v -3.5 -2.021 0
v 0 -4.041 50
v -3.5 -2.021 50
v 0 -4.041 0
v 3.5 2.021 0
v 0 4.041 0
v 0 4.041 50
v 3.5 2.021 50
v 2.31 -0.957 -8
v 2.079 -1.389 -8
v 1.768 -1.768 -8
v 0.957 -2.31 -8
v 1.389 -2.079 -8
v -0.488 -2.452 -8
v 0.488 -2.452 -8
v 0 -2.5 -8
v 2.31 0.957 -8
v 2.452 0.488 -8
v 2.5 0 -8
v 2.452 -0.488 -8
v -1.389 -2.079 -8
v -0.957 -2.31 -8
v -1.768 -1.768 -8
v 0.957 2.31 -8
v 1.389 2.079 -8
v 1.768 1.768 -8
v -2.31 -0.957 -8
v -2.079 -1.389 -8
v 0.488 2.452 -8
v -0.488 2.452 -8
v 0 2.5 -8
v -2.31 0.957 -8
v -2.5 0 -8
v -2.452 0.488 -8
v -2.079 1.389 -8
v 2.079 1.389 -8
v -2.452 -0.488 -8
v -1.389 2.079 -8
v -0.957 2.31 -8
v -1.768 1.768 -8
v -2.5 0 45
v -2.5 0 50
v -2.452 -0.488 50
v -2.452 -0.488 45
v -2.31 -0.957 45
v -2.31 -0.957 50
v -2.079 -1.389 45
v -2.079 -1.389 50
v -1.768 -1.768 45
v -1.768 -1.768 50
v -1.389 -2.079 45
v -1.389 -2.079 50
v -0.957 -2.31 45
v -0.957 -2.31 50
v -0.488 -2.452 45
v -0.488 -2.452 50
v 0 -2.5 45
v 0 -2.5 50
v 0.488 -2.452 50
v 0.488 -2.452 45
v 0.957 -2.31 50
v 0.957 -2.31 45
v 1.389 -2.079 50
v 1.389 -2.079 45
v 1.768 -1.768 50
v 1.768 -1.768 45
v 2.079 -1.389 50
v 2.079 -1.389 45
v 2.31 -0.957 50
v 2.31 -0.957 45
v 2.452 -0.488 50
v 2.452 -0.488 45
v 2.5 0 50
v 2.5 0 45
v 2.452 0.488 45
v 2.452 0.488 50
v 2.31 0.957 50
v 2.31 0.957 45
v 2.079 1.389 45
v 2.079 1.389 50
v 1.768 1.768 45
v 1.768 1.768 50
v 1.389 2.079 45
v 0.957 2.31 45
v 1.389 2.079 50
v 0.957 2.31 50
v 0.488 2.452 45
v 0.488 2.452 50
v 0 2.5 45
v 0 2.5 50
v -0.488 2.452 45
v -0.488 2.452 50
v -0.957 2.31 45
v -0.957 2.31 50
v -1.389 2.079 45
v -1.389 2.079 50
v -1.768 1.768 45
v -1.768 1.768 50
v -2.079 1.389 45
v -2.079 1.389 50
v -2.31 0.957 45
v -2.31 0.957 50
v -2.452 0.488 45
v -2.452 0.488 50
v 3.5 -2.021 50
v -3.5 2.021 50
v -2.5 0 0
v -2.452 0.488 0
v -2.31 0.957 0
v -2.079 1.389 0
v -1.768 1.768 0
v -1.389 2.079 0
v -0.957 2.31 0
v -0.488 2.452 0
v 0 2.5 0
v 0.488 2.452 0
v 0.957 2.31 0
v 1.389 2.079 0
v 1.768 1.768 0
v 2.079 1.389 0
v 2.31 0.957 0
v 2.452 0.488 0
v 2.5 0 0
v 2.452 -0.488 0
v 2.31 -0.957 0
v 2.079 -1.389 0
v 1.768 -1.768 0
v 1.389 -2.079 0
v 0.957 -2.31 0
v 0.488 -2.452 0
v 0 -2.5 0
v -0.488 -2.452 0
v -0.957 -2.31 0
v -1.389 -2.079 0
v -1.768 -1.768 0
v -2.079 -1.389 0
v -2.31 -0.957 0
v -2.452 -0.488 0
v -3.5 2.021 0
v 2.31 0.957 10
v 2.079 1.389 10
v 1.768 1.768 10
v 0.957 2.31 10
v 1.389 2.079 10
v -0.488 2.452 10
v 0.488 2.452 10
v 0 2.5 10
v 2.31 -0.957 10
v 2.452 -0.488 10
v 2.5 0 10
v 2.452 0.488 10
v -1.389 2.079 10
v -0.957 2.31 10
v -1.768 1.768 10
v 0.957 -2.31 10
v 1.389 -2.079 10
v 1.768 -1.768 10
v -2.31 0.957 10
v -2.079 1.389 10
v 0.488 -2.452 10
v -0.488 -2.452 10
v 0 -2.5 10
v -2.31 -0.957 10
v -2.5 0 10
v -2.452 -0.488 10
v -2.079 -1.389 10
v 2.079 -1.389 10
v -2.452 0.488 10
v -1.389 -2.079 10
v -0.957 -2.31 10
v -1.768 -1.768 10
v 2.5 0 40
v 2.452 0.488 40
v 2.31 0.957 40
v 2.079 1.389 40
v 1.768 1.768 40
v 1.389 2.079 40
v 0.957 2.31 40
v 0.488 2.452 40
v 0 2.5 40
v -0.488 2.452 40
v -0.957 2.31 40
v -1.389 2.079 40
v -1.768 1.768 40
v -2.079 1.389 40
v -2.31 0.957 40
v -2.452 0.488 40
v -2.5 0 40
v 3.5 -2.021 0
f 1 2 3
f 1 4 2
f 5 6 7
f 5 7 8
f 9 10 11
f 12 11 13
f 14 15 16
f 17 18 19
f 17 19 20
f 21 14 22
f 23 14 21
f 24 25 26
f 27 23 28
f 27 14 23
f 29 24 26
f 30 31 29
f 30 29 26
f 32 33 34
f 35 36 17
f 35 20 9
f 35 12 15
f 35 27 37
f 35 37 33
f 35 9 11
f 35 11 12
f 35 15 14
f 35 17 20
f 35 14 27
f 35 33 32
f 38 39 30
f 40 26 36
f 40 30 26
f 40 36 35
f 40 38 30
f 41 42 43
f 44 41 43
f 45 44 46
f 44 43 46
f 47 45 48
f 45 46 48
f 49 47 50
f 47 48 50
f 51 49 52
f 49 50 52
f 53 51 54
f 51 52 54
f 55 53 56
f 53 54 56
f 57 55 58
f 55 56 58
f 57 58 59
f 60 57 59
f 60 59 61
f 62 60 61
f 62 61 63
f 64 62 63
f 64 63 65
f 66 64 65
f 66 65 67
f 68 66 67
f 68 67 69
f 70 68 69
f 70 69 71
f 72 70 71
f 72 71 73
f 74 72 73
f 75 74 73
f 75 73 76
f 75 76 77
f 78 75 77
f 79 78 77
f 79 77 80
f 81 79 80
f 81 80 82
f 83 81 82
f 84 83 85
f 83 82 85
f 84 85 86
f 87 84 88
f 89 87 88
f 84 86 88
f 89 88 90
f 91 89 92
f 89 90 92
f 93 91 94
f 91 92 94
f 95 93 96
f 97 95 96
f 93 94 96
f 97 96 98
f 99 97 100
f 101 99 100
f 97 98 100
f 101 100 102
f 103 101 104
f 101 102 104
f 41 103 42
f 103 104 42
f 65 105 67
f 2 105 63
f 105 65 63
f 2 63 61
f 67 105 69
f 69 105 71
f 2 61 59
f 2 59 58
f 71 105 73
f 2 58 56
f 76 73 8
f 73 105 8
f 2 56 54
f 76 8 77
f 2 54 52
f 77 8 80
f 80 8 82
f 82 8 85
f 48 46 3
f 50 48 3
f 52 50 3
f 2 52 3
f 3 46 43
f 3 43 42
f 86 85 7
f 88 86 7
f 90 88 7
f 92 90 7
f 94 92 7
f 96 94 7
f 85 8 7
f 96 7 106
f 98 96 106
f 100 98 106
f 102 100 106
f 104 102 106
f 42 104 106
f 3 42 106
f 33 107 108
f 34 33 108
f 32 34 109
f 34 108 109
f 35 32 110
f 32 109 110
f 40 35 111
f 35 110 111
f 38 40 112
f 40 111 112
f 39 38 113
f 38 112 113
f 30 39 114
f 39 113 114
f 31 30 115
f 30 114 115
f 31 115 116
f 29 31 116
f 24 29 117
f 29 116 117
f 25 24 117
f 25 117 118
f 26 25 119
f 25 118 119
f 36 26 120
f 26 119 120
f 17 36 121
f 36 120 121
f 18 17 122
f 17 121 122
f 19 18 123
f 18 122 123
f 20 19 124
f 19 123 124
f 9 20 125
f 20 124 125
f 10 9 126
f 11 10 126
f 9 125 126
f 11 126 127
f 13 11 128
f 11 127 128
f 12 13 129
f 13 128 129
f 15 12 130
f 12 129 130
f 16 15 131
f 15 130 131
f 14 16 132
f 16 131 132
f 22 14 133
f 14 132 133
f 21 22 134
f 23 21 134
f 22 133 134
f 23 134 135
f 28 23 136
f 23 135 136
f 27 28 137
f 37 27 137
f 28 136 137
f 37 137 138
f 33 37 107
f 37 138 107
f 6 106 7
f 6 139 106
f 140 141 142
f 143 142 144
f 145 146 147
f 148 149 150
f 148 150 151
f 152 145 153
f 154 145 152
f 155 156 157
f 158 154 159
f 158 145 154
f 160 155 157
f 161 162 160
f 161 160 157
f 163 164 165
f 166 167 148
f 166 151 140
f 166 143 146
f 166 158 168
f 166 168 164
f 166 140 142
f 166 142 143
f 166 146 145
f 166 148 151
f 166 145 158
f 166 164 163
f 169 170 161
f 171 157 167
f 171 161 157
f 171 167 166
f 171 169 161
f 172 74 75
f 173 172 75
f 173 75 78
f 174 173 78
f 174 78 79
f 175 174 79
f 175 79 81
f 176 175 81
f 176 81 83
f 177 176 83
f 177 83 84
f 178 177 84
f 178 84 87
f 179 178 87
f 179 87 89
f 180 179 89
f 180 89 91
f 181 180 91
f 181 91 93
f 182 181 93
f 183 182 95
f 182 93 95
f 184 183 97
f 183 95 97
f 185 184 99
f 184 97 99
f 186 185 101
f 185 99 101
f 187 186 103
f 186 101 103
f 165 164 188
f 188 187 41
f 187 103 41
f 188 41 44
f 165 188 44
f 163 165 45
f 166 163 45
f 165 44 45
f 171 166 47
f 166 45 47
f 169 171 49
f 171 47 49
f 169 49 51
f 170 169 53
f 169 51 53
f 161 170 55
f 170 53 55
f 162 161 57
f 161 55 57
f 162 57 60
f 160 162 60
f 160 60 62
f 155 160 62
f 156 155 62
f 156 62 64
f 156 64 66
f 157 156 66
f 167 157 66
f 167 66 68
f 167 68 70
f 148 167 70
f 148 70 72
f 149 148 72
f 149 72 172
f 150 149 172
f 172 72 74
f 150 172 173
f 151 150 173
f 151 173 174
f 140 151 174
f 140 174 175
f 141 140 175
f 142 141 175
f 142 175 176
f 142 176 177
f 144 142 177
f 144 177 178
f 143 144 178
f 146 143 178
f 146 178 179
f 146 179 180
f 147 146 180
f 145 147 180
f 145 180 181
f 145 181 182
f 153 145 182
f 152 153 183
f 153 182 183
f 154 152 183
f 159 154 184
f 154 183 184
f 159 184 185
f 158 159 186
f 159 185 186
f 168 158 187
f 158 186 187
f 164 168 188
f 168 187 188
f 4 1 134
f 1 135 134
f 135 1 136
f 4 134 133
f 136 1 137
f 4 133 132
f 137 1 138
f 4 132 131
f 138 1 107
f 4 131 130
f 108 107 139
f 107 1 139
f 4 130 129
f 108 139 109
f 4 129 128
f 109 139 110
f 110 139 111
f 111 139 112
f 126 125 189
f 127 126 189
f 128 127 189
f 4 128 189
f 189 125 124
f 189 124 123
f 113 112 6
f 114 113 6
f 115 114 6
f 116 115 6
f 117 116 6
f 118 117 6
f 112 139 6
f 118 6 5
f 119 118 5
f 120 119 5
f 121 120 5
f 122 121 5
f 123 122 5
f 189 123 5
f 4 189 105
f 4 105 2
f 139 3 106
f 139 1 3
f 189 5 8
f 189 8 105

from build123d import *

# Parameters (mm, degrees)
EXTRUDE_1_DEPTH     = 60
SKETCH_2_R          = 2.5
EXTRUDE_2_DEPTH     = 8
SKETCH_3_R          = 2.5
CUT_EXTRUDE_1_DEPTH = 50
SKETCH_4_R          = 11.437088518
CUT_EXTRUDE_2_DEPTH = 20
EXTRUDE_3_DEPTH     = 5
SKETCH_6_R          = 2.5
CUT_EXTRUDE_3_DEPTH = 16
EXTRUDE_5_DEPTH     = 5
SKETCH_9_R          = 2.5
CUT_EXTRUDE_4_DEPTH = 5


with BuildPart() as part:
    # 草图1 → 凸台-拉伸1 (new body)
    with BuildSketch(Plane.XY):
        Polygon((3.5, -2.020725942), (3.5, 2.020725942), (0, 4.041451884), (-3.5, 2.020725942), (-3.5, -2.020725942), (0, -4.041451884), align=None)
    extrude(amount=EXTRUDE_1_DEPTH)

    # 草图2 → 凸台-拉伸2 (add)
    with BuildSketch(Plane(origin=(0, 0, 0), x_dir=(-1, 0, 0), z_dir=(0, 0, -1))):
        Circle(SKETCH_2_R)
    extrude(amount=EXTRUDE_2_DEPTH)

    # 草图3 → 切除-拉伸1 (cut)
    with BuildSketch(Plane.XY.offset(60)):
        with Locations(Location((0, 0, 0), (0, 0, 180))):
            Circle(SKETCH_3_R)
    extrude(amount=-CUT_EXTRUDE_1_DEPTH, mode=Mode.SUBTRACT)

    # 草图4 → 切除-拉伸2 (cut)
    with BuildSketch(Plane.XY.offset(60)):
        with Locations((-0.3770193, 0.287149771)):
            Circle(SKETCH_4_R)
    extrude(amount=-CUT_EXTRUDE_2_DEPTH, mode=Mode.SUBTRACT)

    # 草图5 → 凸台-拉伸3 (add)
    with BuildSketch(Plane.XY.offset(40)):
        Polygon((0, 4.041451884), (-3.5, 2.020725942), (-3.5, -2.020725942), (0, -4.041451884), (3.5, -2.020725942), (3.5, 2.020725942), align=None)
    extrude(amount=EXTRUDE_3_DEPTH)

    # 草图6 → 切除-拉伸3 (cut)
    with BuildSketch(Plane.XY.offset(45)):
        Circle(SKETCH_6_R)
    extrude(amount=-CUT_EXTRUDE_3_DEPTH, mode=Mode.SUBTRACT)

    # 草图7 → 凸台-拉伸5 (add)
    with BuildSketch(Plane.XY.offset(45)):
        Polygon((-3.5, 2.020725942), (0, 4.041451884), (3.5, 2.020725942), (3.5, -2.020725942), (0, -4.041451884), (-3.5, -2.020725942), align=None)
    extrude(amount=EXTRUDE_5_DEPTH)

    # 草图9 → 切除-拉伸4 (cut)
    with BuildSketch(Plane.XY.offset(50)):
        with Locations(Location((0, 0, 0), (0, 0, 180))):
            Circle(SKETCH_9_R)
    extrude(amount=-CUT_EXTRUDE_4_DEPTH, mode=Mode.SUBTRACT)


solid = part.part
